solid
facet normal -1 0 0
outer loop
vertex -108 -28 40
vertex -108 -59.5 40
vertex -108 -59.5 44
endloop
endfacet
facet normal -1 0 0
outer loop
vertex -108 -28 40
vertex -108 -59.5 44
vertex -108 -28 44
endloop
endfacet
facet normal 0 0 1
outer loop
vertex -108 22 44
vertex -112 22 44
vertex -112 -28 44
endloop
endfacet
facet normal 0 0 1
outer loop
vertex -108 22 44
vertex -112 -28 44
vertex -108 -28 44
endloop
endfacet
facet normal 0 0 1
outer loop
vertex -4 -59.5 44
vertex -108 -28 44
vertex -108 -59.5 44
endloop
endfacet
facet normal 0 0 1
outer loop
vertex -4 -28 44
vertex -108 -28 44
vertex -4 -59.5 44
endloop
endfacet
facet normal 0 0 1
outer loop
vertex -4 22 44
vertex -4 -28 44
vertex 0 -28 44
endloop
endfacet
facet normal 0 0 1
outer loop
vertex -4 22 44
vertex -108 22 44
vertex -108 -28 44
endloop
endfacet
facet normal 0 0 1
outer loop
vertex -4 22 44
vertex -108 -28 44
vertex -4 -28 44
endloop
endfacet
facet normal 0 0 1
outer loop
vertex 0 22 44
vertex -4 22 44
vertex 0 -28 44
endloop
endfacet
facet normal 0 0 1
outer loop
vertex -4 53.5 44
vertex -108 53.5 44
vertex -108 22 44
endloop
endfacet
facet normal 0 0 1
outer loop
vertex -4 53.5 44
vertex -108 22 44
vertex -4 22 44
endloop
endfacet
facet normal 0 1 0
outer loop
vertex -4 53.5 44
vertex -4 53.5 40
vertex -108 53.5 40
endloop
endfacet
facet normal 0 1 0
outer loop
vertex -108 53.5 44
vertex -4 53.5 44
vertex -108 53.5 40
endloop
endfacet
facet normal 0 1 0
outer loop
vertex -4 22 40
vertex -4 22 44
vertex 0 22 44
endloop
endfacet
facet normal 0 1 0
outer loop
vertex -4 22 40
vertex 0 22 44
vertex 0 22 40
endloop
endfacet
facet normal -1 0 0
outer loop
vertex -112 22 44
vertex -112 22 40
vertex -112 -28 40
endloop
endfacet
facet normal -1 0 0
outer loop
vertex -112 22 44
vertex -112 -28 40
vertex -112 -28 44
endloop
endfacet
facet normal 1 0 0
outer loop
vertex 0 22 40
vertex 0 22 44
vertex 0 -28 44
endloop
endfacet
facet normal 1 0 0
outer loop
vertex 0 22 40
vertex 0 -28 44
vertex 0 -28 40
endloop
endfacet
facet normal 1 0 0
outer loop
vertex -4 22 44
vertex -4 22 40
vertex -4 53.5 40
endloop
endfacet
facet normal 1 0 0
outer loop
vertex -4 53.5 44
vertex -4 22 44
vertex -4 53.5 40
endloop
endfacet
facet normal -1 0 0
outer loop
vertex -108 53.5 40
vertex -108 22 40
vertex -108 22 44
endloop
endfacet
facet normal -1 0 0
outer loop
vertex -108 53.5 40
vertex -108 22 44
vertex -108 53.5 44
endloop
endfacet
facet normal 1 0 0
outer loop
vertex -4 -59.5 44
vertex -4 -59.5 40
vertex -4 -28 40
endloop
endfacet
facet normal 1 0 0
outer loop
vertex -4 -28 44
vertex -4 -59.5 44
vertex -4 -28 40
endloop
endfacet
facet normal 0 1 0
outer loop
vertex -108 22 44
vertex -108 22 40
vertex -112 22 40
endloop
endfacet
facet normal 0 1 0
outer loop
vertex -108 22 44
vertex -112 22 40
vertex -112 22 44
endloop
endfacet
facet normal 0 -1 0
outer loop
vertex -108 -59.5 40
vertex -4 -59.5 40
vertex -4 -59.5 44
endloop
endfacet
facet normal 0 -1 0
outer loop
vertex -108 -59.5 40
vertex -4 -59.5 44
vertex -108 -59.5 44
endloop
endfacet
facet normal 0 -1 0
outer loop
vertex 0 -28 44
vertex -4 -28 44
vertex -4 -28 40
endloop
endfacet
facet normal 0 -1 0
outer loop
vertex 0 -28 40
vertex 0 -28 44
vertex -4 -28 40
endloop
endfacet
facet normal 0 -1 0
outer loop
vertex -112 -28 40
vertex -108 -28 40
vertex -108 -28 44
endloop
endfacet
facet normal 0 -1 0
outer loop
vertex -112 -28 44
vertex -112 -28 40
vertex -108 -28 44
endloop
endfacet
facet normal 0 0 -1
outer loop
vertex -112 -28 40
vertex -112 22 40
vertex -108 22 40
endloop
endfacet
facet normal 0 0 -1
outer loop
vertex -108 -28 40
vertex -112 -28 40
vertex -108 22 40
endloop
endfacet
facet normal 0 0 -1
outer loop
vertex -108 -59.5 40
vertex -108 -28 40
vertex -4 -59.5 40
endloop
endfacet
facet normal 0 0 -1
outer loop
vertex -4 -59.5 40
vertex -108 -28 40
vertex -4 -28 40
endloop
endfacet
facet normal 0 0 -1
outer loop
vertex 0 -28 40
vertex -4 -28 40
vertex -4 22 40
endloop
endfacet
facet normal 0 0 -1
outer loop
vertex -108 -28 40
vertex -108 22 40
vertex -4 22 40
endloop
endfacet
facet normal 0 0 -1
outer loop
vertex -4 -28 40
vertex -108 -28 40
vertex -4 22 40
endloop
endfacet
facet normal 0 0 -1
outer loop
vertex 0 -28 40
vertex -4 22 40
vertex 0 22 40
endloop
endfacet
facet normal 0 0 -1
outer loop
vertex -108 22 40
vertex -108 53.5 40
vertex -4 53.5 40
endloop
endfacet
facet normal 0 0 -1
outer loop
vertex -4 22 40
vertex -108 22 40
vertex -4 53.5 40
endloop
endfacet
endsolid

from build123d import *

# Parameters (mm, degrees)
SKETCH_2_W          = 104
SKETCH_2_H          = 163
EXTRUDE_1_DEPTH     = 4
SKETCH_4_W          = 104
SKETCH_4_H          = 29.5
SKETCH_4_H_2        = 20.5
CUT_EXTRUDE_1_DEPTH = 4
SKETCH_5_W          = 4
SKETCH_5_H          = 50
EXTRUDE_2_DEPTH     = 4
SKETCH_7_W          = 4
SKETCH_7_H          = 50
EXTRUDE_3_DEPTH     = 4


with BuildPart() as part:
    # 스케치2 → 보스-돌출1 (new body)
    with BuildSketch(Plane.XY.offset(40)):
        with Locations((-56, 1.5)):
            Rectangle(SKETCH_2_W, SKETCH_2_H)
    extrude(amount=EXTRUDE_1_DEPTH)

    # 스케치4 → 컷-돌출1 (cut)
    with BuildSketch(Plane(origin=(0, 0, 40), x_dir=(-1, 0, 0), z_dir=(0, 0, -1))):
        with Locations((56, 68.25)):
            Rectangle(SKETCH_4_W, SKETCH_4_H)
        with Locations((56, -69.75)):
            Rectangle(SKETCH_4_W, SKETCH_4_H_2)
    extrude(amount=-CUT_EXTRUDE_1_DEPTH, mode=Mode.SUBTRACT)

    # 스케치5 → 보스-돌출2 (add)
    with BuildSketch(Plane.ZY.offset(108)):
        with Locations((42, -3)):
            Rectangle(SKETCH_5_W, SKETCH_5_H)
    extrude(amount=EXTRUDE_2_DEPTH)

    # 스케치7 → 보스-돌출3 (add)
    with BuildSketch(Plane(origin=(-4, 0, 0), x_dir=(0, 0, -1), z_dir=(1, 0, 0))):
        with Locations((-42, -3)):
            Rectangle(SKETCH_7_W, SKETCH_7_H)
    extrude(amount=EXTRUDE_3_DEPTH)


solid = part.part
